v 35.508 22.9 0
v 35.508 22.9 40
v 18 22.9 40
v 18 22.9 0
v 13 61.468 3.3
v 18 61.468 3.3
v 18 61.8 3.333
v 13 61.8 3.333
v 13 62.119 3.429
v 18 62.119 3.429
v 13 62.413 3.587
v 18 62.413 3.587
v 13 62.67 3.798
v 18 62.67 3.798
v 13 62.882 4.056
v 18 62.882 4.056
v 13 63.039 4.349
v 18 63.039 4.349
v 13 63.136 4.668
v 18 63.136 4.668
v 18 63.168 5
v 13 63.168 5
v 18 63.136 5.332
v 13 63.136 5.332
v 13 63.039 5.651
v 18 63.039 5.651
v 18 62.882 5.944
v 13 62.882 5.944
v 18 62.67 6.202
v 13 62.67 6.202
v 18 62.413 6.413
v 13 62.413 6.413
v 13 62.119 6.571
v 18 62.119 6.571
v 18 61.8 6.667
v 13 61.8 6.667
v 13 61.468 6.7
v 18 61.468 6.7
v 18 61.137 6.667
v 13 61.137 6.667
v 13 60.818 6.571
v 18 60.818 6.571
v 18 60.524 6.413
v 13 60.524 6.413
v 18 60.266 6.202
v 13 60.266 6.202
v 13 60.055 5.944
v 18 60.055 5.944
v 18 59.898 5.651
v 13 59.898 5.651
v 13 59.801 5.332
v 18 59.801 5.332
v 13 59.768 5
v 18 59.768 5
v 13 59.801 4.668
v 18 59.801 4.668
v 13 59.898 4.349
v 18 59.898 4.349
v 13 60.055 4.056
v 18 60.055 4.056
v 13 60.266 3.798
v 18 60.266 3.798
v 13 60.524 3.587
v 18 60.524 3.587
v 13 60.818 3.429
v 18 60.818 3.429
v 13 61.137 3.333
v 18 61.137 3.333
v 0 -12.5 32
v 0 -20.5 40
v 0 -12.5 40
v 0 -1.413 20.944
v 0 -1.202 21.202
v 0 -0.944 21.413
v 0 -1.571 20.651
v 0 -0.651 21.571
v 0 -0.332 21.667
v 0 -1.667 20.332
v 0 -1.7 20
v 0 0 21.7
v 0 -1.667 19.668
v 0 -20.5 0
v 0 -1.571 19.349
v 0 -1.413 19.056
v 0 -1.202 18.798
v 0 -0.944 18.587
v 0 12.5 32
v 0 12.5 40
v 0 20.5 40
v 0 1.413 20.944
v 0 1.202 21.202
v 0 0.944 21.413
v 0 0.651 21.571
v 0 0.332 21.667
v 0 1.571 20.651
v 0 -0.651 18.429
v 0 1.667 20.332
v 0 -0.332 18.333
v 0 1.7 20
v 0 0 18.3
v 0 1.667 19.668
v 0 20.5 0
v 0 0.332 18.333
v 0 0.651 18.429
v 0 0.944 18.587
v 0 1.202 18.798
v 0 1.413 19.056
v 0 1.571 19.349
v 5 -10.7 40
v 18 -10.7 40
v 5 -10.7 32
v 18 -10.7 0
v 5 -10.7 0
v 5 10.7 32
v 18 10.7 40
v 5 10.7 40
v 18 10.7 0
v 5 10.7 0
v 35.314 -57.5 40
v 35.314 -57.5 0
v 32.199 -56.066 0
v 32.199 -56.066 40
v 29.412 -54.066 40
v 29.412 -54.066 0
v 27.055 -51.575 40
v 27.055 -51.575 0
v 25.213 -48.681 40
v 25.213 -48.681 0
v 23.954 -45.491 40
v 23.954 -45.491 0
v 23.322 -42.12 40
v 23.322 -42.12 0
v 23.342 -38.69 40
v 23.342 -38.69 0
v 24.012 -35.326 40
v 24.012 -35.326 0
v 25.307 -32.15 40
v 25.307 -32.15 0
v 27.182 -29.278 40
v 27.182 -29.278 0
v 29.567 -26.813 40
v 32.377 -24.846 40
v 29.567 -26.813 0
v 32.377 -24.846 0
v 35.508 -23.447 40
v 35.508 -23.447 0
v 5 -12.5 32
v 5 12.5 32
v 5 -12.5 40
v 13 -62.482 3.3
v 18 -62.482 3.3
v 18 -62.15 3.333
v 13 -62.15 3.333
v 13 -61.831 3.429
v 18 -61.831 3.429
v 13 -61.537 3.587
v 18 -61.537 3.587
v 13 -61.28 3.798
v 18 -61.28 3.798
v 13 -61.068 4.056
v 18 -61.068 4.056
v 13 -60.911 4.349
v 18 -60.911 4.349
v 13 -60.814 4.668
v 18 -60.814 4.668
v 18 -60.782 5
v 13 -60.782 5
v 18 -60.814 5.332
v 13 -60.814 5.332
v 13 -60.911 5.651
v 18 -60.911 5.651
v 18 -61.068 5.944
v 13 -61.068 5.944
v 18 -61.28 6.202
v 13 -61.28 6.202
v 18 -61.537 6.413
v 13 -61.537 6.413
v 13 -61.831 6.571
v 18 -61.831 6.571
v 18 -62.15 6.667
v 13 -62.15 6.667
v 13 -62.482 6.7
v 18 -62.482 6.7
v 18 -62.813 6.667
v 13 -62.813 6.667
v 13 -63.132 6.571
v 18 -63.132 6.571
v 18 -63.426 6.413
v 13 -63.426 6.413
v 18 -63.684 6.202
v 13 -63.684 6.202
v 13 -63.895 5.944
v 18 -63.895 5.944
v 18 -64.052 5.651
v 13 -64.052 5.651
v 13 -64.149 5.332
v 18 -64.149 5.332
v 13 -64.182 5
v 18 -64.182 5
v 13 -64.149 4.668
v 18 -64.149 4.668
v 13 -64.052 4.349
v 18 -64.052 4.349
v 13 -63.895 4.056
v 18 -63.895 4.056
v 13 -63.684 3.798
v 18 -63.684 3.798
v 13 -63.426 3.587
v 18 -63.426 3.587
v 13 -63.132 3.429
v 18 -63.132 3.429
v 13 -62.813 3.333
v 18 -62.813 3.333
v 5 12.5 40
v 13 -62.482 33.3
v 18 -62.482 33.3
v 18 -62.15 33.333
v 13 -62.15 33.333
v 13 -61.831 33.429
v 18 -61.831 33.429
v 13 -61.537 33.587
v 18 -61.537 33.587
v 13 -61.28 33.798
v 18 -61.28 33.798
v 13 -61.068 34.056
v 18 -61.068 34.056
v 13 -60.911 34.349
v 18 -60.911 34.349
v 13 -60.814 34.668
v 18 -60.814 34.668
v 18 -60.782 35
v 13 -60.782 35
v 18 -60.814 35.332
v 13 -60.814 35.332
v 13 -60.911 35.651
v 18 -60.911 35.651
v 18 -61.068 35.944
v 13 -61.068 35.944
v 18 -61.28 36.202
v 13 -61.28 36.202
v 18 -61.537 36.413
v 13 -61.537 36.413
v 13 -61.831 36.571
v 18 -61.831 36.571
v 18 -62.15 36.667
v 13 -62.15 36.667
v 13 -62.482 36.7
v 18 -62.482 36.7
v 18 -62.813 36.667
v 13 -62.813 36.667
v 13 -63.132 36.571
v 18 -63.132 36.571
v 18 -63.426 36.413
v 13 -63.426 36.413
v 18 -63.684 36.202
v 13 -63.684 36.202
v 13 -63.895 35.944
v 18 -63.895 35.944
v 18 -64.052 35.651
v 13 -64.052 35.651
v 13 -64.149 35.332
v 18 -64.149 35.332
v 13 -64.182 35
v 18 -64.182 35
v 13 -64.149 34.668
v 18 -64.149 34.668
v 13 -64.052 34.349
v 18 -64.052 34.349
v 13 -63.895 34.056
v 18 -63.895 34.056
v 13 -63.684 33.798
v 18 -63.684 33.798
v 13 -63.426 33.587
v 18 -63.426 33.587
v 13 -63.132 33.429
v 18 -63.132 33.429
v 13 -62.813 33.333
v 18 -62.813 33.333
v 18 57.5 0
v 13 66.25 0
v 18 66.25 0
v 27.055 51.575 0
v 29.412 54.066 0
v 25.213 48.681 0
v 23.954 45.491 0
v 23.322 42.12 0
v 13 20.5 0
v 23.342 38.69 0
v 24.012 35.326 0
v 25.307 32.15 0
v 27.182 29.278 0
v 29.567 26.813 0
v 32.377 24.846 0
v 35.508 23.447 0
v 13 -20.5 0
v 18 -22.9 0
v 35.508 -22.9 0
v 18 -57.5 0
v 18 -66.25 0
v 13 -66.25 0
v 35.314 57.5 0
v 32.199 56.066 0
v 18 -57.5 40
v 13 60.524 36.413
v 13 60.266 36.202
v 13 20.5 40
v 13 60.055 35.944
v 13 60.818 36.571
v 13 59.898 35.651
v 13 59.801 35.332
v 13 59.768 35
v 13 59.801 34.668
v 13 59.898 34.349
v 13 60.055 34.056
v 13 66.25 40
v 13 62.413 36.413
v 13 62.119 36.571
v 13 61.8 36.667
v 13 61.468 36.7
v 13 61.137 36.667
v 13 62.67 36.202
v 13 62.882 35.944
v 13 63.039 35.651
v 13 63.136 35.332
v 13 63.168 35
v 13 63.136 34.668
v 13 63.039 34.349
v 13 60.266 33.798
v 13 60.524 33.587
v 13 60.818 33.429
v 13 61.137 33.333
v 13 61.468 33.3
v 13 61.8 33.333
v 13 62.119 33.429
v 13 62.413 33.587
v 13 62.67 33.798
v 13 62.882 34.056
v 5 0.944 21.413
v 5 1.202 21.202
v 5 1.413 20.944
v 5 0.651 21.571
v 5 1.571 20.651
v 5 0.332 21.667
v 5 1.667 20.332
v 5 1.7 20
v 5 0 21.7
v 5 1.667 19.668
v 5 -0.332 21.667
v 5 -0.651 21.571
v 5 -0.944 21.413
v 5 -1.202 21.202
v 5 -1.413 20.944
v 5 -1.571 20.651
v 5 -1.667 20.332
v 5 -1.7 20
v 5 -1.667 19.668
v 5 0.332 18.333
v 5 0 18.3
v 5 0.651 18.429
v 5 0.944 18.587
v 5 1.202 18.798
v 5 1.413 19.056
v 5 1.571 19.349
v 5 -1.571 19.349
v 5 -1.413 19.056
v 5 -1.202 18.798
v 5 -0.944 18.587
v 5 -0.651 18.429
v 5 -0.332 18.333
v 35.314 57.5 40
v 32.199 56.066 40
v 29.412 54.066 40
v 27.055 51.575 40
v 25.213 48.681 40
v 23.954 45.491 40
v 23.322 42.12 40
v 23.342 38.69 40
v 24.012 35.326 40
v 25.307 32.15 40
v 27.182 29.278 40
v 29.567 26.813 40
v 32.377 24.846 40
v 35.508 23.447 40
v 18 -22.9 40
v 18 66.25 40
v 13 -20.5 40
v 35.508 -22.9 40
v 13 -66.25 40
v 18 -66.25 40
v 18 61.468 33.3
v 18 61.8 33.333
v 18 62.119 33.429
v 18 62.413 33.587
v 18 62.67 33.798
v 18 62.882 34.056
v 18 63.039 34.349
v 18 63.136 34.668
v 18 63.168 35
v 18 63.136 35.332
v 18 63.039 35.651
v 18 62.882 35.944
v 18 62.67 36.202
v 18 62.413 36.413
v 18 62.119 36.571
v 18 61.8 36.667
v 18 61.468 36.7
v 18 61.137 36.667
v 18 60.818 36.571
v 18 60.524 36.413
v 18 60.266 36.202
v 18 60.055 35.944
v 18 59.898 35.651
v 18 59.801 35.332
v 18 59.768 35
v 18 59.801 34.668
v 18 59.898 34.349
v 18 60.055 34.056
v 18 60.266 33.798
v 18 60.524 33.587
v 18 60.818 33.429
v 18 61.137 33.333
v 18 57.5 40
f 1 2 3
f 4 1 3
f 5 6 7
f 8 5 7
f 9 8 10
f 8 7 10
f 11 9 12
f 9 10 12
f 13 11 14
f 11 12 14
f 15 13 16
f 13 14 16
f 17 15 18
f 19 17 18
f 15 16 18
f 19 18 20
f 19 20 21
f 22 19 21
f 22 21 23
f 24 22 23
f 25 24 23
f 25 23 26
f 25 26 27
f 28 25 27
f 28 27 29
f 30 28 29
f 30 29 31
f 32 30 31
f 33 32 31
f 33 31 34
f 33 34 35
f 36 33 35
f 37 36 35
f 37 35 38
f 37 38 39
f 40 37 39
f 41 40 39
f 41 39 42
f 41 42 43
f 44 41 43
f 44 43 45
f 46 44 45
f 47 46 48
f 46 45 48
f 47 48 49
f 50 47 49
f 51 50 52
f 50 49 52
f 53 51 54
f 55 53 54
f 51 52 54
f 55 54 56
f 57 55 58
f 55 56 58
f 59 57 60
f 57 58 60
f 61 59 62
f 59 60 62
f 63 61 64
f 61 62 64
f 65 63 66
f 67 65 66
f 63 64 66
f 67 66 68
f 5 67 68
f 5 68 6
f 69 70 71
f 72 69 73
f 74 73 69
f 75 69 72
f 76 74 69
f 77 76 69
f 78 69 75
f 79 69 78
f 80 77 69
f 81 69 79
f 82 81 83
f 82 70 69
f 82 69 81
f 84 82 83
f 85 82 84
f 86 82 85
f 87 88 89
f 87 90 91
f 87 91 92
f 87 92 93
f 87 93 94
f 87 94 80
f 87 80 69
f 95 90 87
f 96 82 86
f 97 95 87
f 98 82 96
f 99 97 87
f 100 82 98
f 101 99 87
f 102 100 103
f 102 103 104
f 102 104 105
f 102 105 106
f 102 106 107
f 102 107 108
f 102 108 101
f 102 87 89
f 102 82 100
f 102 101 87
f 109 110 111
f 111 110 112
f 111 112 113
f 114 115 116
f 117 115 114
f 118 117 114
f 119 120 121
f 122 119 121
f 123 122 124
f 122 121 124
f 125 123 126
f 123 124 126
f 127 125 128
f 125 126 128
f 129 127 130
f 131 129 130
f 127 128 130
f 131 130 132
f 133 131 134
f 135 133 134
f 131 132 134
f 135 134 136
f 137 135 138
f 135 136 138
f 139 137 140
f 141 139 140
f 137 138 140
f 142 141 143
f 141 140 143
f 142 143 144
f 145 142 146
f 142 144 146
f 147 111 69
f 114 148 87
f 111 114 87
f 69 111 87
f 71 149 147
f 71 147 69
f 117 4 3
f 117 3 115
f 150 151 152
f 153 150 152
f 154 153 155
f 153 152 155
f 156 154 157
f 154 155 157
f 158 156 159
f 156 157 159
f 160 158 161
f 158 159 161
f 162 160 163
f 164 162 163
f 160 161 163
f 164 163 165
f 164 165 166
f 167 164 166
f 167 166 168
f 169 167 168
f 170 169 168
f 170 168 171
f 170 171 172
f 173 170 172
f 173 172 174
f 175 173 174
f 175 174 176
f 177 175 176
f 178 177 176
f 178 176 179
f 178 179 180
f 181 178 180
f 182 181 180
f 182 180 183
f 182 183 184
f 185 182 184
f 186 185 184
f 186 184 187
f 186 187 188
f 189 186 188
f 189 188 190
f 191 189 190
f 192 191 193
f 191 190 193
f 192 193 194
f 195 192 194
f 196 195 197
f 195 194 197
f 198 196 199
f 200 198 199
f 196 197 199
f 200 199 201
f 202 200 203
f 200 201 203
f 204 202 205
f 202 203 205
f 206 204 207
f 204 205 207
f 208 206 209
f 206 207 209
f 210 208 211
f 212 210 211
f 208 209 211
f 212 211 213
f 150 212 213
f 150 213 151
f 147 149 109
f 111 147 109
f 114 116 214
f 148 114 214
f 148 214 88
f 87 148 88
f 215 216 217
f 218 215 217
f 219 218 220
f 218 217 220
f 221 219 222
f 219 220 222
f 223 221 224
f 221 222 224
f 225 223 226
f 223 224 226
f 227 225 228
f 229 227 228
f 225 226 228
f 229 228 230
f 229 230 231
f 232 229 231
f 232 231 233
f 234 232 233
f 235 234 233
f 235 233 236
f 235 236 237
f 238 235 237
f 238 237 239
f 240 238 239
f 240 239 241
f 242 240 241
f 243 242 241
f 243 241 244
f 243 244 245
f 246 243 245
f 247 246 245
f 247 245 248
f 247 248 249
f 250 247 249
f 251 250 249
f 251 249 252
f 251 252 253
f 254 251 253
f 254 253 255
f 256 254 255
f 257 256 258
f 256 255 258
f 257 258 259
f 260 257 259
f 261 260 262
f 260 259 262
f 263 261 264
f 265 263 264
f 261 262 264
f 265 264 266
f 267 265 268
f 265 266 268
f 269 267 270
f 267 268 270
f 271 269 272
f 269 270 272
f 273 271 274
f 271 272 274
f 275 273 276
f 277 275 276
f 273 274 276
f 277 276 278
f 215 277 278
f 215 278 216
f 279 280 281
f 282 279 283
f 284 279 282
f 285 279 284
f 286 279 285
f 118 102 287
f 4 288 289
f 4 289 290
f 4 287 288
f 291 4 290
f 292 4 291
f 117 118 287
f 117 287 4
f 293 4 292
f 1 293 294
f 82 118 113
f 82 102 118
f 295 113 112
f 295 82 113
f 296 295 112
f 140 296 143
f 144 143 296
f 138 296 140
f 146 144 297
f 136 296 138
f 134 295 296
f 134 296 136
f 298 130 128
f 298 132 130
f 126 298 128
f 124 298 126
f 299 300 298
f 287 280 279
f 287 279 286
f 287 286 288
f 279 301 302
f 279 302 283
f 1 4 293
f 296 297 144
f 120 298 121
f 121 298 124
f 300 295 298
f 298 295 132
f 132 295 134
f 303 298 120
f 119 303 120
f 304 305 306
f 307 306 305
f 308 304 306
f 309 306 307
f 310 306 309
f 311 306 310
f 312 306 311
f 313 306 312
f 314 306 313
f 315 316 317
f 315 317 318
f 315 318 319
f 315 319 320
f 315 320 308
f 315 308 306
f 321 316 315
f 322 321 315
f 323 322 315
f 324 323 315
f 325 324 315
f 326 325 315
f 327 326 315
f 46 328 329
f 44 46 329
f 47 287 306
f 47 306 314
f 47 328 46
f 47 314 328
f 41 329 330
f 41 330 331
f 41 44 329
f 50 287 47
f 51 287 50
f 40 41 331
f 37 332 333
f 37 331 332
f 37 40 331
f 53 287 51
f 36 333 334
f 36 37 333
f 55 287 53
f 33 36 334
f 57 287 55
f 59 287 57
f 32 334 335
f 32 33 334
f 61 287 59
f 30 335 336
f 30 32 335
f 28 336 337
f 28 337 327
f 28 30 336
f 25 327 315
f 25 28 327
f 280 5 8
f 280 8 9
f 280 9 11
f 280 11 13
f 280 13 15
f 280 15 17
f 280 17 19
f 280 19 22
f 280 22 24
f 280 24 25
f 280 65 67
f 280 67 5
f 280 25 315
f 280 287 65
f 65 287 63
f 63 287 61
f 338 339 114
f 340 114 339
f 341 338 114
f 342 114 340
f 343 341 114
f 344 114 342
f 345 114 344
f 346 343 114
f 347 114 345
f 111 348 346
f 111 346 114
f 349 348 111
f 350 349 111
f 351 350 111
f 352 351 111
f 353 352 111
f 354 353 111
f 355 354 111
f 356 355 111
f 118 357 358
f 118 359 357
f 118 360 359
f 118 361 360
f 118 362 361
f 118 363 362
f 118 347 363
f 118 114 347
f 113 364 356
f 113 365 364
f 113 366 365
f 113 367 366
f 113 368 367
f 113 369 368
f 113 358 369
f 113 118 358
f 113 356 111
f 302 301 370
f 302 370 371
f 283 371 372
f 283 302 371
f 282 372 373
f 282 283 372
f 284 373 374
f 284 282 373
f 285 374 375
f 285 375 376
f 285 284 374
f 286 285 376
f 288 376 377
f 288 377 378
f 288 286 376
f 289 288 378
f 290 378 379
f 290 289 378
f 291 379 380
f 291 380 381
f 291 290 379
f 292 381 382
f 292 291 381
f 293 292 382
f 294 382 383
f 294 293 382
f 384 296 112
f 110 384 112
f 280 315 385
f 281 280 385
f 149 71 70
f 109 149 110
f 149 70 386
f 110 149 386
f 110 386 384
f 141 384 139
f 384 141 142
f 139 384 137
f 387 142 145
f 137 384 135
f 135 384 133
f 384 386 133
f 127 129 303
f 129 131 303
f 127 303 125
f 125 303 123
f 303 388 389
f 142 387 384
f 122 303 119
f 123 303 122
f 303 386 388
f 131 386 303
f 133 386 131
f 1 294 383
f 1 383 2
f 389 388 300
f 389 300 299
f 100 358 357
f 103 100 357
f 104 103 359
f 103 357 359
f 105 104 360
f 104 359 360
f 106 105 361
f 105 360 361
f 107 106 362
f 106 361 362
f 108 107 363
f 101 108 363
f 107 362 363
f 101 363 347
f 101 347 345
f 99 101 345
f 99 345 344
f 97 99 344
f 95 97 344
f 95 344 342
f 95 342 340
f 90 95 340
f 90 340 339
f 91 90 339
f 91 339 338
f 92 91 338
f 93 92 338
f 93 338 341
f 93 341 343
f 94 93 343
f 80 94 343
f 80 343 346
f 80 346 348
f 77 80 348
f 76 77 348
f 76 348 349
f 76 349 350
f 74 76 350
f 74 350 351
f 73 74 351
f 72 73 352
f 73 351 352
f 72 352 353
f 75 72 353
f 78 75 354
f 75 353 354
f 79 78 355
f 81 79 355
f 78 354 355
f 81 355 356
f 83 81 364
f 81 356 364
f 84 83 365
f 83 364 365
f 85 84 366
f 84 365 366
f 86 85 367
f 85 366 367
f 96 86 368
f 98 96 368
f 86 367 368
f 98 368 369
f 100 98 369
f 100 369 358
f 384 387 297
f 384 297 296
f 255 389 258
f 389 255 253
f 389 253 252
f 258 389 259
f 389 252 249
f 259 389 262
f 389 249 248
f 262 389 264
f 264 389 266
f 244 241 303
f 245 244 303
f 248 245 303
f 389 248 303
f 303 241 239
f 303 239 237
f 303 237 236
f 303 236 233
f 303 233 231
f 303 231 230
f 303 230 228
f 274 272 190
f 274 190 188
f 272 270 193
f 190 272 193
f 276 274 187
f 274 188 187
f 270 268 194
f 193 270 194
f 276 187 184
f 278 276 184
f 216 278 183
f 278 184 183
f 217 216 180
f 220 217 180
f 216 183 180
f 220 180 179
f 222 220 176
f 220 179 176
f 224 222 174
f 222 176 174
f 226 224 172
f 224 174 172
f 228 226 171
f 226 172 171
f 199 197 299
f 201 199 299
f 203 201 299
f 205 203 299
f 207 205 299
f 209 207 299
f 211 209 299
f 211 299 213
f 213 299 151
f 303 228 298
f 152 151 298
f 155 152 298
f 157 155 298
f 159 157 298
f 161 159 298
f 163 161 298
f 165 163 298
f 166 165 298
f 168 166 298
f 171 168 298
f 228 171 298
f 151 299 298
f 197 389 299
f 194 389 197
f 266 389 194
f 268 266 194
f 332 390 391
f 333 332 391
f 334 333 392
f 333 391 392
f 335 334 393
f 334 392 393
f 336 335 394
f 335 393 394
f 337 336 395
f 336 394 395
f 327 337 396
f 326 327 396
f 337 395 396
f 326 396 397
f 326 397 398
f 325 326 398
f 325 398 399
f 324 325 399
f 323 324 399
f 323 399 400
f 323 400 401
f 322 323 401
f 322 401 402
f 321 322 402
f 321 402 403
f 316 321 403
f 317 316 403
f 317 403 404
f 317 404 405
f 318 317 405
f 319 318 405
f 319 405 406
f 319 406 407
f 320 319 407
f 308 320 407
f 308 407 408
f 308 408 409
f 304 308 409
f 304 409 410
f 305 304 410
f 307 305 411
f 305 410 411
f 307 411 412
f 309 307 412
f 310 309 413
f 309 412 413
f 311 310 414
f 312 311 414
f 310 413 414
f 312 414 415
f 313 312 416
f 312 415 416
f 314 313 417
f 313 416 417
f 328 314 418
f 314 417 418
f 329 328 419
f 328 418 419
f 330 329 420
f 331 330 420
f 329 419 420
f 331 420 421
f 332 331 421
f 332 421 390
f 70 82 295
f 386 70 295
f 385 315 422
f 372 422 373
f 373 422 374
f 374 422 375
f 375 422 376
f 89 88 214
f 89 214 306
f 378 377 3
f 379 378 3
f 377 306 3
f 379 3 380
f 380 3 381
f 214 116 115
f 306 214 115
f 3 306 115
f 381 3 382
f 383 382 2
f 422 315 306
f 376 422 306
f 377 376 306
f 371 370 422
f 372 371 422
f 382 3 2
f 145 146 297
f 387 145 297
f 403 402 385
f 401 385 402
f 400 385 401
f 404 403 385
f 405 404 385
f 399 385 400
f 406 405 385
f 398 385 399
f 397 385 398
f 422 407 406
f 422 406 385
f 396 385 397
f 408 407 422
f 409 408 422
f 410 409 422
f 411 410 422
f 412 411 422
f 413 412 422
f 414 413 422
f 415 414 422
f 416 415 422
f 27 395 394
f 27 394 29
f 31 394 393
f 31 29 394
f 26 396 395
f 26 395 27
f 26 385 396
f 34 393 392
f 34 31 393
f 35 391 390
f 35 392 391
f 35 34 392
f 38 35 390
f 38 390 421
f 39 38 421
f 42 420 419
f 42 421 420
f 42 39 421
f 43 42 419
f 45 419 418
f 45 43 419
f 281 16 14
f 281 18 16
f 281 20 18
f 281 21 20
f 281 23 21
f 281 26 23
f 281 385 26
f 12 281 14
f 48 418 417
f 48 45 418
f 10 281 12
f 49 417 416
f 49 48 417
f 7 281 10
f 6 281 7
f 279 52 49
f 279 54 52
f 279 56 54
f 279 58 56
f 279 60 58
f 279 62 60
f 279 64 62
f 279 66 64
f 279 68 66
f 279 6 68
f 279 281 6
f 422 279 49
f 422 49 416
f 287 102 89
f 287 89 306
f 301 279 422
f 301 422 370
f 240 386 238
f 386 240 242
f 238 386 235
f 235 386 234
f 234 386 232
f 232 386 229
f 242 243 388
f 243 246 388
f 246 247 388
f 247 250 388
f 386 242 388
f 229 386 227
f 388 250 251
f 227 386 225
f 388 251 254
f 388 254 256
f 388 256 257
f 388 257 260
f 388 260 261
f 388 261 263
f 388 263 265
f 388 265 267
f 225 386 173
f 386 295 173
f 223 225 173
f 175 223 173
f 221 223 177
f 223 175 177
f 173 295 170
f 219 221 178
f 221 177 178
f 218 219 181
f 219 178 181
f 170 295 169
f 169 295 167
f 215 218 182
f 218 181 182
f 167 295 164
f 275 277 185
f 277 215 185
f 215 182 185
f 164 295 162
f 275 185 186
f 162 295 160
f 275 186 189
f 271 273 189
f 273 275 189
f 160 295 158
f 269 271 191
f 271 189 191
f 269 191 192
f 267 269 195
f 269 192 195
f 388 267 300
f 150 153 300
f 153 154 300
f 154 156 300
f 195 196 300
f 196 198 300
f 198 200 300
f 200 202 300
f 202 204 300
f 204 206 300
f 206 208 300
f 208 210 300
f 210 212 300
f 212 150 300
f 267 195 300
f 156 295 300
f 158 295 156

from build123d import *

# Parameters (mm, degrees)
BOSS_EXTRUDE1_DEPTH  = 40
M3_CLEARANCE_HOLE1_D = 3.4
SKETCH6_W            = 5
SKETCH6_H            = 25
CUT_EXTRUDE1_DEPTH   = 8
M3_CLEARANCE_HOLE2_D = 3.4


with BuildPart() as part:
    # Sketch1 → Boss-Extrude1 (new body)
    with BuildSketch(Plane.XY):
        with BuildLine():
            Line((5, 0), (0, 0))
            Line((0, 0), (0, -20.5))
            Line((0, -20.5), (13, -20.5))
            Line((13, -20.5), (13, -66.25))
            Line((13, -66.25), (18, -66.25))
            Line((18, -66.25), (18, -57.5))
            Line((18, -57.5), (35.314368035, -57.5))
            ThreePointArc((35.314368035, -57.5), (23.250292021, -40.40428558), (35.508342613, -23.447116675))
            Line((35.508342613, -23.447116675), (35.508342613, -22.9))
            Line((35.508342613, -22.9), (18, -22.9))
            Line((18, -22.9), (18, -10.7))
            Line((18, -10.7), (5, -10.7))
            Line((5, -10.7), (5, 0))
        make_face()
    boss_extrude1 = extrude(amount=BOSS_EXTRUDE1_DEPTH)

    # Mirror1: Boss-Extrude1 across plane
    add(boss_extrude1.mirror(Plane.ZX))

    # M3 Clearance Hole1 (through all)
    with Locations(Plane.ZY.offset(-13)):
        with Locations((35, -62.481816862), (5, -62.481816862), (35, 61.468183138), (5, 61.468183138)):
            Hole(M3_CLEARANCE_HOLE1_D / 2)

    # Sketch6 → Cut-Extrude1 (cut)
    with BuildSketch(Plane(origin=(0, 0, 40), x_dir=(-1, 0, 0), z_dir=(0, 0, -1))):
        with Locations((-2.5, 0)):
            Rectangle(SKETCH6_W, SKETCH6_H)
    extrude(amount=CUT_EXTRUDE1_DEPTH, mode=Mode.SUBTRACT)

    # M3 Clearance Hole2 (through all)
    with Locations(Plane.ZY):
        with Locations((20, 0)):
            Hole(M3_CLEARANCE_HOLE2_D / 2)


solid = part.part
